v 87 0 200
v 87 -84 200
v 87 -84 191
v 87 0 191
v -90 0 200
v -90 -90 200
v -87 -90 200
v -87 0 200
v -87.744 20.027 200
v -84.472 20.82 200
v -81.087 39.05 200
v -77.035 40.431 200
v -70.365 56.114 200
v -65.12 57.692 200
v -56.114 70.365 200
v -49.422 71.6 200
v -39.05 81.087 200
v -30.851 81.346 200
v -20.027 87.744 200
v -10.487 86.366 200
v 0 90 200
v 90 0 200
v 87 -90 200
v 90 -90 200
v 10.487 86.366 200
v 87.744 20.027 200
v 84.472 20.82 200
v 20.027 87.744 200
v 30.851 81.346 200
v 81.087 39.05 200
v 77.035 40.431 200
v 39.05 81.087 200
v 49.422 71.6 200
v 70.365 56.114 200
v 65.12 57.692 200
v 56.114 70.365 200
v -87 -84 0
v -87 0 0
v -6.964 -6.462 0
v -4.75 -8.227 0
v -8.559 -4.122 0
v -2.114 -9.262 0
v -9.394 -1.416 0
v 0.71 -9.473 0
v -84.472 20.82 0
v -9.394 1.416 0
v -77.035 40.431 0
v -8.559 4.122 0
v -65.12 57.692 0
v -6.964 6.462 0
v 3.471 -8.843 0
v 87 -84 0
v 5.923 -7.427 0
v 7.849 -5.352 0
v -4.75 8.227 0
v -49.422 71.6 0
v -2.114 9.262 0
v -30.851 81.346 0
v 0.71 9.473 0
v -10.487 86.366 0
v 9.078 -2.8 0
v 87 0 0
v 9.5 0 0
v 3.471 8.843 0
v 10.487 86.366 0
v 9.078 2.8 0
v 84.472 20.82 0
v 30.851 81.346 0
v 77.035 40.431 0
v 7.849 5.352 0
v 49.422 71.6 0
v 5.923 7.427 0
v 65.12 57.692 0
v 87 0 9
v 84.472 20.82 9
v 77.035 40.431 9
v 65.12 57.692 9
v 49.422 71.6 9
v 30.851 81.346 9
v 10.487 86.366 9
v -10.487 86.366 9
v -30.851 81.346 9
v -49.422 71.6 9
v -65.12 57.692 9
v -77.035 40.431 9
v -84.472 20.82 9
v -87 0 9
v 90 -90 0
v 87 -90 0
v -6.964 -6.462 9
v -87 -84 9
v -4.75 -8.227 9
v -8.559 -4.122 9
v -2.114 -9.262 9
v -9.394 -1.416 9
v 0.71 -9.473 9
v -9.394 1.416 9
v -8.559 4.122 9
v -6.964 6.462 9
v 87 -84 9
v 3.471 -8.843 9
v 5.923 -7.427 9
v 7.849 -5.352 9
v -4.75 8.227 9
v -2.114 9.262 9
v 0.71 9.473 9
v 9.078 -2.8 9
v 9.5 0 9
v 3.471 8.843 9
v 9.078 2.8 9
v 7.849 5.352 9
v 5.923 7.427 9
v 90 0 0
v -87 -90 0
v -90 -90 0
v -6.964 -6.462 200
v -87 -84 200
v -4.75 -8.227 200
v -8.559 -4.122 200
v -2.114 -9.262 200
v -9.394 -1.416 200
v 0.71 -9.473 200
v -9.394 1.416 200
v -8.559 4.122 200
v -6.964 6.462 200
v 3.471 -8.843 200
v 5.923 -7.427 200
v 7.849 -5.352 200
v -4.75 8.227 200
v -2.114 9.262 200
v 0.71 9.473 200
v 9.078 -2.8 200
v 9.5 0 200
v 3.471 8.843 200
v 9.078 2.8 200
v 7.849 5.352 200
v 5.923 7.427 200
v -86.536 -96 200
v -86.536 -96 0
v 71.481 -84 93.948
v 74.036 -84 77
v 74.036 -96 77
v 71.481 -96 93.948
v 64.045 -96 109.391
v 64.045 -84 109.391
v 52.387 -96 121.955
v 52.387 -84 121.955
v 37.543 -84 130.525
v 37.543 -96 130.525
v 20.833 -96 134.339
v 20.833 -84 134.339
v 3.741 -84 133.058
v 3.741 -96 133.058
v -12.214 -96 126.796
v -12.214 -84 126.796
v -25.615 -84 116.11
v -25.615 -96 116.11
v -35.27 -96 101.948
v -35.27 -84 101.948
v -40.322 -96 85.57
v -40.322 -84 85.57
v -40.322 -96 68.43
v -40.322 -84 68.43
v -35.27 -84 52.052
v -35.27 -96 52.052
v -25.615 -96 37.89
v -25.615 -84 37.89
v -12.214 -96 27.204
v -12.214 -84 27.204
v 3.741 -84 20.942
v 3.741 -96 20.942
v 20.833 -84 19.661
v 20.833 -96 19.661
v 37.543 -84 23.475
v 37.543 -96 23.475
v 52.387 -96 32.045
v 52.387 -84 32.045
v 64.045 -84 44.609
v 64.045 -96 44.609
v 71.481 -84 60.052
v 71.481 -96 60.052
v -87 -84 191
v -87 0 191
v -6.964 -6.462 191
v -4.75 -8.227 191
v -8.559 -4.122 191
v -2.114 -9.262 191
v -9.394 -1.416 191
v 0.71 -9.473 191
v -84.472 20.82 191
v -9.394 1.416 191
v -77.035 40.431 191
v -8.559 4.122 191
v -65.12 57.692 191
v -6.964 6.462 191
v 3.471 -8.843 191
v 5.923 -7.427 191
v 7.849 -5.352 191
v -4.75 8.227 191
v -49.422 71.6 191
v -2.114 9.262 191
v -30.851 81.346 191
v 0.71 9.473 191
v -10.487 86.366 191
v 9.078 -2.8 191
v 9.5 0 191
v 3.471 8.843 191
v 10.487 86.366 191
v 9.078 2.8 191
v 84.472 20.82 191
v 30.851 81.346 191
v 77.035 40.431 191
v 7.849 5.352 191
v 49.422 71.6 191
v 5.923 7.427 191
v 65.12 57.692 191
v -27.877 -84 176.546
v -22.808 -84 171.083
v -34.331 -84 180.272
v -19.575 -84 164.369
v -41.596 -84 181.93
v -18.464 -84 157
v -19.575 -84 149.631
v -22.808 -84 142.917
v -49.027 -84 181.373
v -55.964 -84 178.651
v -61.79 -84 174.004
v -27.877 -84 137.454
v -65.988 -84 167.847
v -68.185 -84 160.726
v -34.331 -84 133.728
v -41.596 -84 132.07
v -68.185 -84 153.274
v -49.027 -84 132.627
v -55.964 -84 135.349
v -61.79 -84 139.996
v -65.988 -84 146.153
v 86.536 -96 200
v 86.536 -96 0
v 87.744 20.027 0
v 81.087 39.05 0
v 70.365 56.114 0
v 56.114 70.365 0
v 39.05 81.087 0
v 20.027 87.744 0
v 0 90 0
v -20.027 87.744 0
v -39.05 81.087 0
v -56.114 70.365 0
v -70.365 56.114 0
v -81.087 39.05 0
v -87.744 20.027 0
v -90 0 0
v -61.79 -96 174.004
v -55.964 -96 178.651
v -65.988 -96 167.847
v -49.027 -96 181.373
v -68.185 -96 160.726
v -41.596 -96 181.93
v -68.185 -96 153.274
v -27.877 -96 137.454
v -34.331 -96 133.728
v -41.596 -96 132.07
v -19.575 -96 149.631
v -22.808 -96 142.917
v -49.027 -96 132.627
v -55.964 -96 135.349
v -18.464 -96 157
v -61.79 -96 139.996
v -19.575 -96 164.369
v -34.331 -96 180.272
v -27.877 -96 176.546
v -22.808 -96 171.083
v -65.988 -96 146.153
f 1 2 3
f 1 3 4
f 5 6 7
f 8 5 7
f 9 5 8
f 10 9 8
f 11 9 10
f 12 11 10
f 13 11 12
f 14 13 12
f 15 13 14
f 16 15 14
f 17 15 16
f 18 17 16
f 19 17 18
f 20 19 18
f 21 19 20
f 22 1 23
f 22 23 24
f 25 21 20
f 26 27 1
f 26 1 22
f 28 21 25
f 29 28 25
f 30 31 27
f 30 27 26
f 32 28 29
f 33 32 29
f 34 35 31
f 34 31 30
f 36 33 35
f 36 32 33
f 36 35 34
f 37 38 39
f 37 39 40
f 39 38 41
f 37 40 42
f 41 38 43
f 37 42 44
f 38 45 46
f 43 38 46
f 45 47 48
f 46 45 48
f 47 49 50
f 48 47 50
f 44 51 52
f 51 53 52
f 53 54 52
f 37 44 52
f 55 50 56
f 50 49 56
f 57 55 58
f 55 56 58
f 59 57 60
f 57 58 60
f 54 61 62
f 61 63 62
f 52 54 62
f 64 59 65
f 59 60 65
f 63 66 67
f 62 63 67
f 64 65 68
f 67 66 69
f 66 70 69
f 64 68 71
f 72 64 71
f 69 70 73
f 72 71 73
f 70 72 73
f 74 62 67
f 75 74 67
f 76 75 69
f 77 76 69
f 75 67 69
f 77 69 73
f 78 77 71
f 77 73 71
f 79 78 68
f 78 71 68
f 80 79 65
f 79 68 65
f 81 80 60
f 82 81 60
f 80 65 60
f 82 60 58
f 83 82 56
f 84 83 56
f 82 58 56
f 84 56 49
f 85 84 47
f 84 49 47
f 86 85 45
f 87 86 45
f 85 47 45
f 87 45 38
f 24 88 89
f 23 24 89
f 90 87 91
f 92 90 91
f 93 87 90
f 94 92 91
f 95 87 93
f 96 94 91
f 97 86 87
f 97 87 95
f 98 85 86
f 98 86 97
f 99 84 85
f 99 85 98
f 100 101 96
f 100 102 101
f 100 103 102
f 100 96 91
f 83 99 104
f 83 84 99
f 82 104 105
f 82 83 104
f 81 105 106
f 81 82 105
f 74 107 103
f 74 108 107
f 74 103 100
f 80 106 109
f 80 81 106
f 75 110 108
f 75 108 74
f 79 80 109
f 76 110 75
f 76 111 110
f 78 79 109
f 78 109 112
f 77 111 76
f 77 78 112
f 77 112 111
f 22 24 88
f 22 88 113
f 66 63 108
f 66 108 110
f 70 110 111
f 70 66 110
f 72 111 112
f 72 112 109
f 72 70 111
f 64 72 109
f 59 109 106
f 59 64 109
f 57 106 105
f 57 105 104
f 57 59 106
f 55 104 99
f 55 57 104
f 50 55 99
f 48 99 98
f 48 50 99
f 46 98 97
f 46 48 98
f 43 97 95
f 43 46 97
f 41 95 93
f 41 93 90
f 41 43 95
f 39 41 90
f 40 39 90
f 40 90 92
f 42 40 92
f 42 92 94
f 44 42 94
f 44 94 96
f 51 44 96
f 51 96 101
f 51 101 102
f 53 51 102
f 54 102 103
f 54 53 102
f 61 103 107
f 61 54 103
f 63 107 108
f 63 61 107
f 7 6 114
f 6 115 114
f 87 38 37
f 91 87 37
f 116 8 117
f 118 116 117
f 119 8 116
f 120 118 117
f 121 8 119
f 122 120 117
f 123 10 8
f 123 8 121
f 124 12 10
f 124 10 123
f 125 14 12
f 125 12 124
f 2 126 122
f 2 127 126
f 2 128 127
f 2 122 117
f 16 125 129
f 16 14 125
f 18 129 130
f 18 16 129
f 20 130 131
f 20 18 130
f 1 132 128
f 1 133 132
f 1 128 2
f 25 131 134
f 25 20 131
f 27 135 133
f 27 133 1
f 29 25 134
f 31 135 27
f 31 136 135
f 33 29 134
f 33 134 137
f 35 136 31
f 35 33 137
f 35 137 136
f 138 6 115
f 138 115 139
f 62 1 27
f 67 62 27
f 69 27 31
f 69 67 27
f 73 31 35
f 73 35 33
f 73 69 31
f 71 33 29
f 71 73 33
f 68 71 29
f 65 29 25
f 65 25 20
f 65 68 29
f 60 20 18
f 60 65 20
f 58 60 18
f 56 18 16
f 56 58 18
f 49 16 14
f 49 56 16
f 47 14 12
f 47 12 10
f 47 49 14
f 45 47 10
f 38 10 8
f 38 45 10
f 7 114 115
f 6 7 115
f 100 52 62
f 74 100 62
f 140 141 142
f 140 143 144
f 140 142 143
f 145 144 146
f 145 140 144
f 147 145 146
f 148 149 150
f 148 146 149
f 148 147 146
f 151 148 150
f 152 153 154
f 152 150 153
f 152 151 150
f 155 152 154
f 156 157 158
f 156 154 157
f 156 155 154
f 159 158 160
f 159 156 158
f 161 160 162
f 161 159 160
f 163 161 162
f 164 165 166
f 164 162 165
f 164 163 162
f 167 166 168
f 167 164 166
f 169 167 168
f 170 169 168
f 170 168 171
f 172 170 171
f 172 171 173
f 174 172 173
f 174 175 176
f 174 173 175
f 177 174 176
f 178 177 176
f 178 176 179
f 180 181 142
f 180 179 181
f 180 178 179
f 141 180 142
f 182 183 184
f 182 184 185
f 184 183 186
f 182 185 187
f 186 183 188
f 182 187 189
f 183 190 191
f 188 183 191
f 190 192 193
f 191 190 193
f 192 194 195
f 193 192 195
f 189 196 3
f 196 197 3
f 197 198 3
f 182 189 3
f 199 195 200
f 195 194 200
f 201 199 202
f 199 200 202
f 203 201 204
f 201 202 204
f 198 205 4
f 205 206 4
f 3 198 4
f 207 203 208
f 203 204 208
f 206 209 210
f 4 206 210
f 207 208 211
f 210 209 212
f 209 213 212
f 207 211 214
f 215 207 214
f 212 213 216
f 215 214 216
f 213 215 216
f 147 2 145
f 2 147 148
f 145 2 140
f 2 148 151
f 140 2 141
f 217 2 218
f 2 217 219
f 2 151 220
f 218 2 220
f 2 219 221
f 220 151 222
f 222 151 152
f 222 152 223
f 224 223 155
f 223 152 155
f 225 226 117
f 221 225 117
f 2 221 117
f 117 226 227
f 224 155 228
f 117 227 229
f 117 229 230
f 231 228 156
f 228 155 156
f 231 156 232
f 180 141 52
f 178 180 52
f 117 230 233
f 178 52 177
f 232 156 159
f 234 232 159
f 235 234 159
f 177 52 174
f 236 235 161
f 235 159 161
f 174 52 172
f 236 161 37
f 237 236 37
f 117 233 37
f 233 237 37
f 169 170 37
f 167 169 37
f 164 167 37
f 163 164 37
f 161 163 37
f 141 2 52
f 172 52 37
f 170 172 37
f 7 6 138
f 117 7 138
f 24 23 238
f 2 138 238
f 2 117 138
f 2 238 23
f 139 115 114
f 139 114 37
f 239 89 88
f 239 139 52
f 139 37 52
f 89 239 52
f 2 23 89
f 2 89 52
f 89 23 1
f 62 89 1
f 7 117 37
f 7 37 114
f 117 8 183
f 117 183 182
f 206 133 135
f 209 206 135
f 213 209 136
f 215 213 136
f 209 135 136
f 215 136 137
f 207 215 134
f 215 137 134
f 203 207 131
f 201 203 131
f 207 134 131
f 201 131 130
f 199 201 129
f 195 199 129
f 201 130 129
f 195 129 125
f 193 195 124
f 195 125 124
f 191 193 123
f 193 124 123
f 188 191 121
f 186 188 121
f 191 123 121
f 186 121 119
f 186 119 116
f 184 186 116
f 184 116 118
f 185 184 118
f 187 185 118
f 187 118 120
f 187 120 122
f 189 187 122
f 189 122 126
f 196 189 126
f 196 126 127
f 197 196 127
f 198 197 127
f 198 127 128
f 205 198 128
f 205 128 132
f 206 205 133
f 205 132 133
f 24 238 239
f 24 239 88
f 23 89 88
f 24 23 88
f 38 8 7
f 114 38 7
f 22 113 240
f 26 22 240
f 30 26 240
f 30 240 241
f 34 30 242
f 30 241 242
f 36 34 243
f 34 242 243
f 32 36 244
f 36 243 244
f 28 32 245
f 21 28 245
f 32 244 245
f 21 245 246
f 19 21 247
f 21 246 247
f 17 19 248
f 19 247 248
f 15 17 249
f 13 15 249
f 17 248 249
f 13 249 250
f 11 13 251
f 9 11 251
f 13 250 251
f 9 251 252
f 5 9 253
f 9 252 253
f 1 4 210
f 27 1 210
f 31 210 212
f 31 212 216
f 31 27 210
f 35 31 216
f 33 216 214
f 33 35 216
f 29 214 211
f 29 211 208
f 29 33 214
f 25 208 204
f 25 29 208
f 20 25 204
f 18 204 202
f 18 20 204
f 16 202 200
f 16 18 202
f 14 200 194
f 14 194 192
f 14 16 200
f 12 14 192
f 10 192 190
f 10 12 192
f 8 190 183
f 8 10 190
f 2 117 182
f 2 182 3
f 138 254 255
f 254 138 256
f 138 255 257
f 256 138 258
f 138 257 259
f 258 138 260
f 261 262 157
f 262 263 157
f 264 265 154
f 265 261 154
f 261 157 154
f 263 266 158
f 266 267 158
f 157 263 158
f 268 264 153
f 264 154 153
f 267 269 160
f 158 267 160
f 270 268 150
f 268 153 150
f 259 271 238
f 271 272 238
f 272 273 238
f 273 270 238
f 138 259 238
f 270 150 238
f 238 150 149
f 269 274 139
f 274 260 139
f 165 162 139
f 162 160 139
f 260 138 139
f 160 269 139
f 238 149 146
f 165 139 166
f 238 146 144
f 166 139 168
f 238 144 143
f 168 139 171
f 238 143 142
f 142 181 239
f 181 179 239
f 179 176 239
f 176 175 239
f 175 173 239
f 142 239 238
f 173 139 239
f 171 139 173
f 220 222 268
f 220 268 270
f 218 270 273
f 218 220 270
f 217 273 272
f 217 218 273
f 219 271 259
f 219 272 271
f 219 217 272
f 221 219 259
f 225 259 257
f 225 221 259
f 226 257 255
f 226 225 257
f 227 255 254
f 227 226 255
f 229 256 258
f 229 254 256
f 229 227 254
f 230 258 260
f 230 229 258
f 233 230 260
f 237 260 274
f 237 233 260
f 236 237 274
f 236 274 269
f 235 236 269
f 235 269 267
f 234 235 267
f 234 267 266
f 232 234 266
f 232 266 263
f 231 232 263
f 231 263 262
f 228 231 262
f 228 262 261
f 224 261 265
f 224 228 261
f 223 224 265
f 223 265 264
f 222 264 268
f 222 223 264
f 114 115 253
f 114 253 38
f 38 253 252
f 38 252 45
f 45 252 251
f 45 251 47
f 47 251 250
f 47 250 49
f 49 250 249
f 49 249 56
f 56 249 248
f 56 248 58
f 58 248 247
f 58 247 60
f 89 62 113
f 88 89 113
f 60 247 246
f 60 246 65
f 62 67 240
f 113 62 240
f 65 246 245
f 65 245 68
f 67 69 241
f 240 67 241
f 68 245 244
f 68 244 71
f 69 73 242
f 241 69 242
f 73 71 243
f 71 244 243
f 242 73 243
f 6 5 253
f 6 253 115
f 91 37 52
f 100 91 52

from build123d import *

# Parameters (mm, degrees)
F1_DEPTH  = 200
F2_T      = -3
F4_DEPTH  = 200
F5_R      = 57.5
F5_R_2    = 25
F6_DEPTH  = 96.001
F7_R      = 9.5
F8_DEPTH  = 9
F9_R      = 9.5
F10_DEPTH = 9


with BuildPart() as f1:
    # F0 (on Top) → F1 (new body)
    with BuildSketch(Plane.XY):
        with BuildLine():
            Line((90, -90), (90, 0))
            ThreePointArc((90, 0), (0, 90), (-90, 0))
            Line((-90, 0), (-90, -90))
            Line((-90, -90), (90, -90))
        make_face()
    extrude(amount=F1_DEPTH)

    # F2
    f2_openings = [f1.faces().sort_by_distance(p)[0] for p in [
        (0, -8.401487, 200),
        (0, -90, 100),
        (0, -8.401487, 0),
    ]]
    offset(amount=F2_T, openings=f2_openings)


with BuildPart() as f4:
    # F3 (on Top) → F4 (new body, through all)
    with BuildSketch(Plane.XY):
        Polygon((87, -84), (-87, -84), (-87, -90), (-90, -90), (-86.535898, -96), (86.535898, -96), (90, -90), (87, -90), align=None)
    extrude(amount=F4_DEPTH)

    # F5 (on Front) → F6 (cut, through all)
    with BuildSketch(Plane.XZ):
        with Locations((16.535898, 77)):
            Circle(F5_R)
        with Locations((-43.464102, 157)):
            Circle(F5_R_2)
    extrude(amount=F6_DEPTH, mode=Mode.SUBTRACT)


with BuildPart() as f8:
    # F7 (on face) → F8 (new body)
    with BuildSketch(Plane.XY.offset(200)):
        with BuildLine():
            ThreePointArc((87, 0), (0, 87), (-87, 0))
            Line((-87, 0), (-87, -84))
            Line((-87, -84), (87, -84))
            Line((87, -84), (87, 0))
        make_face()
        Circle(F7_R, mode=Mode.SUBTRACT)
    extrude(amount=-F8_DEPTH)


with BuildPart() as f10:
    # F9 (on Top) → F10 (new body)
    with BuildSketch(Plane.XY):
        with BuildLine():
            Line((-87, -84), (87, -84))
            Line((87, -84), (87, 0))
            ThreePointArc((87, 0), (0, 87), (-87, 0))
            Line((-87, 0), (-87, -84))
        make_face()
        Circle(F9_R, mode=Mode.SUBTRACT)
    extrude(amount=F10_DEPTH)


solid = Compound([f1.part, f4.part, f8.part, f10.part])
